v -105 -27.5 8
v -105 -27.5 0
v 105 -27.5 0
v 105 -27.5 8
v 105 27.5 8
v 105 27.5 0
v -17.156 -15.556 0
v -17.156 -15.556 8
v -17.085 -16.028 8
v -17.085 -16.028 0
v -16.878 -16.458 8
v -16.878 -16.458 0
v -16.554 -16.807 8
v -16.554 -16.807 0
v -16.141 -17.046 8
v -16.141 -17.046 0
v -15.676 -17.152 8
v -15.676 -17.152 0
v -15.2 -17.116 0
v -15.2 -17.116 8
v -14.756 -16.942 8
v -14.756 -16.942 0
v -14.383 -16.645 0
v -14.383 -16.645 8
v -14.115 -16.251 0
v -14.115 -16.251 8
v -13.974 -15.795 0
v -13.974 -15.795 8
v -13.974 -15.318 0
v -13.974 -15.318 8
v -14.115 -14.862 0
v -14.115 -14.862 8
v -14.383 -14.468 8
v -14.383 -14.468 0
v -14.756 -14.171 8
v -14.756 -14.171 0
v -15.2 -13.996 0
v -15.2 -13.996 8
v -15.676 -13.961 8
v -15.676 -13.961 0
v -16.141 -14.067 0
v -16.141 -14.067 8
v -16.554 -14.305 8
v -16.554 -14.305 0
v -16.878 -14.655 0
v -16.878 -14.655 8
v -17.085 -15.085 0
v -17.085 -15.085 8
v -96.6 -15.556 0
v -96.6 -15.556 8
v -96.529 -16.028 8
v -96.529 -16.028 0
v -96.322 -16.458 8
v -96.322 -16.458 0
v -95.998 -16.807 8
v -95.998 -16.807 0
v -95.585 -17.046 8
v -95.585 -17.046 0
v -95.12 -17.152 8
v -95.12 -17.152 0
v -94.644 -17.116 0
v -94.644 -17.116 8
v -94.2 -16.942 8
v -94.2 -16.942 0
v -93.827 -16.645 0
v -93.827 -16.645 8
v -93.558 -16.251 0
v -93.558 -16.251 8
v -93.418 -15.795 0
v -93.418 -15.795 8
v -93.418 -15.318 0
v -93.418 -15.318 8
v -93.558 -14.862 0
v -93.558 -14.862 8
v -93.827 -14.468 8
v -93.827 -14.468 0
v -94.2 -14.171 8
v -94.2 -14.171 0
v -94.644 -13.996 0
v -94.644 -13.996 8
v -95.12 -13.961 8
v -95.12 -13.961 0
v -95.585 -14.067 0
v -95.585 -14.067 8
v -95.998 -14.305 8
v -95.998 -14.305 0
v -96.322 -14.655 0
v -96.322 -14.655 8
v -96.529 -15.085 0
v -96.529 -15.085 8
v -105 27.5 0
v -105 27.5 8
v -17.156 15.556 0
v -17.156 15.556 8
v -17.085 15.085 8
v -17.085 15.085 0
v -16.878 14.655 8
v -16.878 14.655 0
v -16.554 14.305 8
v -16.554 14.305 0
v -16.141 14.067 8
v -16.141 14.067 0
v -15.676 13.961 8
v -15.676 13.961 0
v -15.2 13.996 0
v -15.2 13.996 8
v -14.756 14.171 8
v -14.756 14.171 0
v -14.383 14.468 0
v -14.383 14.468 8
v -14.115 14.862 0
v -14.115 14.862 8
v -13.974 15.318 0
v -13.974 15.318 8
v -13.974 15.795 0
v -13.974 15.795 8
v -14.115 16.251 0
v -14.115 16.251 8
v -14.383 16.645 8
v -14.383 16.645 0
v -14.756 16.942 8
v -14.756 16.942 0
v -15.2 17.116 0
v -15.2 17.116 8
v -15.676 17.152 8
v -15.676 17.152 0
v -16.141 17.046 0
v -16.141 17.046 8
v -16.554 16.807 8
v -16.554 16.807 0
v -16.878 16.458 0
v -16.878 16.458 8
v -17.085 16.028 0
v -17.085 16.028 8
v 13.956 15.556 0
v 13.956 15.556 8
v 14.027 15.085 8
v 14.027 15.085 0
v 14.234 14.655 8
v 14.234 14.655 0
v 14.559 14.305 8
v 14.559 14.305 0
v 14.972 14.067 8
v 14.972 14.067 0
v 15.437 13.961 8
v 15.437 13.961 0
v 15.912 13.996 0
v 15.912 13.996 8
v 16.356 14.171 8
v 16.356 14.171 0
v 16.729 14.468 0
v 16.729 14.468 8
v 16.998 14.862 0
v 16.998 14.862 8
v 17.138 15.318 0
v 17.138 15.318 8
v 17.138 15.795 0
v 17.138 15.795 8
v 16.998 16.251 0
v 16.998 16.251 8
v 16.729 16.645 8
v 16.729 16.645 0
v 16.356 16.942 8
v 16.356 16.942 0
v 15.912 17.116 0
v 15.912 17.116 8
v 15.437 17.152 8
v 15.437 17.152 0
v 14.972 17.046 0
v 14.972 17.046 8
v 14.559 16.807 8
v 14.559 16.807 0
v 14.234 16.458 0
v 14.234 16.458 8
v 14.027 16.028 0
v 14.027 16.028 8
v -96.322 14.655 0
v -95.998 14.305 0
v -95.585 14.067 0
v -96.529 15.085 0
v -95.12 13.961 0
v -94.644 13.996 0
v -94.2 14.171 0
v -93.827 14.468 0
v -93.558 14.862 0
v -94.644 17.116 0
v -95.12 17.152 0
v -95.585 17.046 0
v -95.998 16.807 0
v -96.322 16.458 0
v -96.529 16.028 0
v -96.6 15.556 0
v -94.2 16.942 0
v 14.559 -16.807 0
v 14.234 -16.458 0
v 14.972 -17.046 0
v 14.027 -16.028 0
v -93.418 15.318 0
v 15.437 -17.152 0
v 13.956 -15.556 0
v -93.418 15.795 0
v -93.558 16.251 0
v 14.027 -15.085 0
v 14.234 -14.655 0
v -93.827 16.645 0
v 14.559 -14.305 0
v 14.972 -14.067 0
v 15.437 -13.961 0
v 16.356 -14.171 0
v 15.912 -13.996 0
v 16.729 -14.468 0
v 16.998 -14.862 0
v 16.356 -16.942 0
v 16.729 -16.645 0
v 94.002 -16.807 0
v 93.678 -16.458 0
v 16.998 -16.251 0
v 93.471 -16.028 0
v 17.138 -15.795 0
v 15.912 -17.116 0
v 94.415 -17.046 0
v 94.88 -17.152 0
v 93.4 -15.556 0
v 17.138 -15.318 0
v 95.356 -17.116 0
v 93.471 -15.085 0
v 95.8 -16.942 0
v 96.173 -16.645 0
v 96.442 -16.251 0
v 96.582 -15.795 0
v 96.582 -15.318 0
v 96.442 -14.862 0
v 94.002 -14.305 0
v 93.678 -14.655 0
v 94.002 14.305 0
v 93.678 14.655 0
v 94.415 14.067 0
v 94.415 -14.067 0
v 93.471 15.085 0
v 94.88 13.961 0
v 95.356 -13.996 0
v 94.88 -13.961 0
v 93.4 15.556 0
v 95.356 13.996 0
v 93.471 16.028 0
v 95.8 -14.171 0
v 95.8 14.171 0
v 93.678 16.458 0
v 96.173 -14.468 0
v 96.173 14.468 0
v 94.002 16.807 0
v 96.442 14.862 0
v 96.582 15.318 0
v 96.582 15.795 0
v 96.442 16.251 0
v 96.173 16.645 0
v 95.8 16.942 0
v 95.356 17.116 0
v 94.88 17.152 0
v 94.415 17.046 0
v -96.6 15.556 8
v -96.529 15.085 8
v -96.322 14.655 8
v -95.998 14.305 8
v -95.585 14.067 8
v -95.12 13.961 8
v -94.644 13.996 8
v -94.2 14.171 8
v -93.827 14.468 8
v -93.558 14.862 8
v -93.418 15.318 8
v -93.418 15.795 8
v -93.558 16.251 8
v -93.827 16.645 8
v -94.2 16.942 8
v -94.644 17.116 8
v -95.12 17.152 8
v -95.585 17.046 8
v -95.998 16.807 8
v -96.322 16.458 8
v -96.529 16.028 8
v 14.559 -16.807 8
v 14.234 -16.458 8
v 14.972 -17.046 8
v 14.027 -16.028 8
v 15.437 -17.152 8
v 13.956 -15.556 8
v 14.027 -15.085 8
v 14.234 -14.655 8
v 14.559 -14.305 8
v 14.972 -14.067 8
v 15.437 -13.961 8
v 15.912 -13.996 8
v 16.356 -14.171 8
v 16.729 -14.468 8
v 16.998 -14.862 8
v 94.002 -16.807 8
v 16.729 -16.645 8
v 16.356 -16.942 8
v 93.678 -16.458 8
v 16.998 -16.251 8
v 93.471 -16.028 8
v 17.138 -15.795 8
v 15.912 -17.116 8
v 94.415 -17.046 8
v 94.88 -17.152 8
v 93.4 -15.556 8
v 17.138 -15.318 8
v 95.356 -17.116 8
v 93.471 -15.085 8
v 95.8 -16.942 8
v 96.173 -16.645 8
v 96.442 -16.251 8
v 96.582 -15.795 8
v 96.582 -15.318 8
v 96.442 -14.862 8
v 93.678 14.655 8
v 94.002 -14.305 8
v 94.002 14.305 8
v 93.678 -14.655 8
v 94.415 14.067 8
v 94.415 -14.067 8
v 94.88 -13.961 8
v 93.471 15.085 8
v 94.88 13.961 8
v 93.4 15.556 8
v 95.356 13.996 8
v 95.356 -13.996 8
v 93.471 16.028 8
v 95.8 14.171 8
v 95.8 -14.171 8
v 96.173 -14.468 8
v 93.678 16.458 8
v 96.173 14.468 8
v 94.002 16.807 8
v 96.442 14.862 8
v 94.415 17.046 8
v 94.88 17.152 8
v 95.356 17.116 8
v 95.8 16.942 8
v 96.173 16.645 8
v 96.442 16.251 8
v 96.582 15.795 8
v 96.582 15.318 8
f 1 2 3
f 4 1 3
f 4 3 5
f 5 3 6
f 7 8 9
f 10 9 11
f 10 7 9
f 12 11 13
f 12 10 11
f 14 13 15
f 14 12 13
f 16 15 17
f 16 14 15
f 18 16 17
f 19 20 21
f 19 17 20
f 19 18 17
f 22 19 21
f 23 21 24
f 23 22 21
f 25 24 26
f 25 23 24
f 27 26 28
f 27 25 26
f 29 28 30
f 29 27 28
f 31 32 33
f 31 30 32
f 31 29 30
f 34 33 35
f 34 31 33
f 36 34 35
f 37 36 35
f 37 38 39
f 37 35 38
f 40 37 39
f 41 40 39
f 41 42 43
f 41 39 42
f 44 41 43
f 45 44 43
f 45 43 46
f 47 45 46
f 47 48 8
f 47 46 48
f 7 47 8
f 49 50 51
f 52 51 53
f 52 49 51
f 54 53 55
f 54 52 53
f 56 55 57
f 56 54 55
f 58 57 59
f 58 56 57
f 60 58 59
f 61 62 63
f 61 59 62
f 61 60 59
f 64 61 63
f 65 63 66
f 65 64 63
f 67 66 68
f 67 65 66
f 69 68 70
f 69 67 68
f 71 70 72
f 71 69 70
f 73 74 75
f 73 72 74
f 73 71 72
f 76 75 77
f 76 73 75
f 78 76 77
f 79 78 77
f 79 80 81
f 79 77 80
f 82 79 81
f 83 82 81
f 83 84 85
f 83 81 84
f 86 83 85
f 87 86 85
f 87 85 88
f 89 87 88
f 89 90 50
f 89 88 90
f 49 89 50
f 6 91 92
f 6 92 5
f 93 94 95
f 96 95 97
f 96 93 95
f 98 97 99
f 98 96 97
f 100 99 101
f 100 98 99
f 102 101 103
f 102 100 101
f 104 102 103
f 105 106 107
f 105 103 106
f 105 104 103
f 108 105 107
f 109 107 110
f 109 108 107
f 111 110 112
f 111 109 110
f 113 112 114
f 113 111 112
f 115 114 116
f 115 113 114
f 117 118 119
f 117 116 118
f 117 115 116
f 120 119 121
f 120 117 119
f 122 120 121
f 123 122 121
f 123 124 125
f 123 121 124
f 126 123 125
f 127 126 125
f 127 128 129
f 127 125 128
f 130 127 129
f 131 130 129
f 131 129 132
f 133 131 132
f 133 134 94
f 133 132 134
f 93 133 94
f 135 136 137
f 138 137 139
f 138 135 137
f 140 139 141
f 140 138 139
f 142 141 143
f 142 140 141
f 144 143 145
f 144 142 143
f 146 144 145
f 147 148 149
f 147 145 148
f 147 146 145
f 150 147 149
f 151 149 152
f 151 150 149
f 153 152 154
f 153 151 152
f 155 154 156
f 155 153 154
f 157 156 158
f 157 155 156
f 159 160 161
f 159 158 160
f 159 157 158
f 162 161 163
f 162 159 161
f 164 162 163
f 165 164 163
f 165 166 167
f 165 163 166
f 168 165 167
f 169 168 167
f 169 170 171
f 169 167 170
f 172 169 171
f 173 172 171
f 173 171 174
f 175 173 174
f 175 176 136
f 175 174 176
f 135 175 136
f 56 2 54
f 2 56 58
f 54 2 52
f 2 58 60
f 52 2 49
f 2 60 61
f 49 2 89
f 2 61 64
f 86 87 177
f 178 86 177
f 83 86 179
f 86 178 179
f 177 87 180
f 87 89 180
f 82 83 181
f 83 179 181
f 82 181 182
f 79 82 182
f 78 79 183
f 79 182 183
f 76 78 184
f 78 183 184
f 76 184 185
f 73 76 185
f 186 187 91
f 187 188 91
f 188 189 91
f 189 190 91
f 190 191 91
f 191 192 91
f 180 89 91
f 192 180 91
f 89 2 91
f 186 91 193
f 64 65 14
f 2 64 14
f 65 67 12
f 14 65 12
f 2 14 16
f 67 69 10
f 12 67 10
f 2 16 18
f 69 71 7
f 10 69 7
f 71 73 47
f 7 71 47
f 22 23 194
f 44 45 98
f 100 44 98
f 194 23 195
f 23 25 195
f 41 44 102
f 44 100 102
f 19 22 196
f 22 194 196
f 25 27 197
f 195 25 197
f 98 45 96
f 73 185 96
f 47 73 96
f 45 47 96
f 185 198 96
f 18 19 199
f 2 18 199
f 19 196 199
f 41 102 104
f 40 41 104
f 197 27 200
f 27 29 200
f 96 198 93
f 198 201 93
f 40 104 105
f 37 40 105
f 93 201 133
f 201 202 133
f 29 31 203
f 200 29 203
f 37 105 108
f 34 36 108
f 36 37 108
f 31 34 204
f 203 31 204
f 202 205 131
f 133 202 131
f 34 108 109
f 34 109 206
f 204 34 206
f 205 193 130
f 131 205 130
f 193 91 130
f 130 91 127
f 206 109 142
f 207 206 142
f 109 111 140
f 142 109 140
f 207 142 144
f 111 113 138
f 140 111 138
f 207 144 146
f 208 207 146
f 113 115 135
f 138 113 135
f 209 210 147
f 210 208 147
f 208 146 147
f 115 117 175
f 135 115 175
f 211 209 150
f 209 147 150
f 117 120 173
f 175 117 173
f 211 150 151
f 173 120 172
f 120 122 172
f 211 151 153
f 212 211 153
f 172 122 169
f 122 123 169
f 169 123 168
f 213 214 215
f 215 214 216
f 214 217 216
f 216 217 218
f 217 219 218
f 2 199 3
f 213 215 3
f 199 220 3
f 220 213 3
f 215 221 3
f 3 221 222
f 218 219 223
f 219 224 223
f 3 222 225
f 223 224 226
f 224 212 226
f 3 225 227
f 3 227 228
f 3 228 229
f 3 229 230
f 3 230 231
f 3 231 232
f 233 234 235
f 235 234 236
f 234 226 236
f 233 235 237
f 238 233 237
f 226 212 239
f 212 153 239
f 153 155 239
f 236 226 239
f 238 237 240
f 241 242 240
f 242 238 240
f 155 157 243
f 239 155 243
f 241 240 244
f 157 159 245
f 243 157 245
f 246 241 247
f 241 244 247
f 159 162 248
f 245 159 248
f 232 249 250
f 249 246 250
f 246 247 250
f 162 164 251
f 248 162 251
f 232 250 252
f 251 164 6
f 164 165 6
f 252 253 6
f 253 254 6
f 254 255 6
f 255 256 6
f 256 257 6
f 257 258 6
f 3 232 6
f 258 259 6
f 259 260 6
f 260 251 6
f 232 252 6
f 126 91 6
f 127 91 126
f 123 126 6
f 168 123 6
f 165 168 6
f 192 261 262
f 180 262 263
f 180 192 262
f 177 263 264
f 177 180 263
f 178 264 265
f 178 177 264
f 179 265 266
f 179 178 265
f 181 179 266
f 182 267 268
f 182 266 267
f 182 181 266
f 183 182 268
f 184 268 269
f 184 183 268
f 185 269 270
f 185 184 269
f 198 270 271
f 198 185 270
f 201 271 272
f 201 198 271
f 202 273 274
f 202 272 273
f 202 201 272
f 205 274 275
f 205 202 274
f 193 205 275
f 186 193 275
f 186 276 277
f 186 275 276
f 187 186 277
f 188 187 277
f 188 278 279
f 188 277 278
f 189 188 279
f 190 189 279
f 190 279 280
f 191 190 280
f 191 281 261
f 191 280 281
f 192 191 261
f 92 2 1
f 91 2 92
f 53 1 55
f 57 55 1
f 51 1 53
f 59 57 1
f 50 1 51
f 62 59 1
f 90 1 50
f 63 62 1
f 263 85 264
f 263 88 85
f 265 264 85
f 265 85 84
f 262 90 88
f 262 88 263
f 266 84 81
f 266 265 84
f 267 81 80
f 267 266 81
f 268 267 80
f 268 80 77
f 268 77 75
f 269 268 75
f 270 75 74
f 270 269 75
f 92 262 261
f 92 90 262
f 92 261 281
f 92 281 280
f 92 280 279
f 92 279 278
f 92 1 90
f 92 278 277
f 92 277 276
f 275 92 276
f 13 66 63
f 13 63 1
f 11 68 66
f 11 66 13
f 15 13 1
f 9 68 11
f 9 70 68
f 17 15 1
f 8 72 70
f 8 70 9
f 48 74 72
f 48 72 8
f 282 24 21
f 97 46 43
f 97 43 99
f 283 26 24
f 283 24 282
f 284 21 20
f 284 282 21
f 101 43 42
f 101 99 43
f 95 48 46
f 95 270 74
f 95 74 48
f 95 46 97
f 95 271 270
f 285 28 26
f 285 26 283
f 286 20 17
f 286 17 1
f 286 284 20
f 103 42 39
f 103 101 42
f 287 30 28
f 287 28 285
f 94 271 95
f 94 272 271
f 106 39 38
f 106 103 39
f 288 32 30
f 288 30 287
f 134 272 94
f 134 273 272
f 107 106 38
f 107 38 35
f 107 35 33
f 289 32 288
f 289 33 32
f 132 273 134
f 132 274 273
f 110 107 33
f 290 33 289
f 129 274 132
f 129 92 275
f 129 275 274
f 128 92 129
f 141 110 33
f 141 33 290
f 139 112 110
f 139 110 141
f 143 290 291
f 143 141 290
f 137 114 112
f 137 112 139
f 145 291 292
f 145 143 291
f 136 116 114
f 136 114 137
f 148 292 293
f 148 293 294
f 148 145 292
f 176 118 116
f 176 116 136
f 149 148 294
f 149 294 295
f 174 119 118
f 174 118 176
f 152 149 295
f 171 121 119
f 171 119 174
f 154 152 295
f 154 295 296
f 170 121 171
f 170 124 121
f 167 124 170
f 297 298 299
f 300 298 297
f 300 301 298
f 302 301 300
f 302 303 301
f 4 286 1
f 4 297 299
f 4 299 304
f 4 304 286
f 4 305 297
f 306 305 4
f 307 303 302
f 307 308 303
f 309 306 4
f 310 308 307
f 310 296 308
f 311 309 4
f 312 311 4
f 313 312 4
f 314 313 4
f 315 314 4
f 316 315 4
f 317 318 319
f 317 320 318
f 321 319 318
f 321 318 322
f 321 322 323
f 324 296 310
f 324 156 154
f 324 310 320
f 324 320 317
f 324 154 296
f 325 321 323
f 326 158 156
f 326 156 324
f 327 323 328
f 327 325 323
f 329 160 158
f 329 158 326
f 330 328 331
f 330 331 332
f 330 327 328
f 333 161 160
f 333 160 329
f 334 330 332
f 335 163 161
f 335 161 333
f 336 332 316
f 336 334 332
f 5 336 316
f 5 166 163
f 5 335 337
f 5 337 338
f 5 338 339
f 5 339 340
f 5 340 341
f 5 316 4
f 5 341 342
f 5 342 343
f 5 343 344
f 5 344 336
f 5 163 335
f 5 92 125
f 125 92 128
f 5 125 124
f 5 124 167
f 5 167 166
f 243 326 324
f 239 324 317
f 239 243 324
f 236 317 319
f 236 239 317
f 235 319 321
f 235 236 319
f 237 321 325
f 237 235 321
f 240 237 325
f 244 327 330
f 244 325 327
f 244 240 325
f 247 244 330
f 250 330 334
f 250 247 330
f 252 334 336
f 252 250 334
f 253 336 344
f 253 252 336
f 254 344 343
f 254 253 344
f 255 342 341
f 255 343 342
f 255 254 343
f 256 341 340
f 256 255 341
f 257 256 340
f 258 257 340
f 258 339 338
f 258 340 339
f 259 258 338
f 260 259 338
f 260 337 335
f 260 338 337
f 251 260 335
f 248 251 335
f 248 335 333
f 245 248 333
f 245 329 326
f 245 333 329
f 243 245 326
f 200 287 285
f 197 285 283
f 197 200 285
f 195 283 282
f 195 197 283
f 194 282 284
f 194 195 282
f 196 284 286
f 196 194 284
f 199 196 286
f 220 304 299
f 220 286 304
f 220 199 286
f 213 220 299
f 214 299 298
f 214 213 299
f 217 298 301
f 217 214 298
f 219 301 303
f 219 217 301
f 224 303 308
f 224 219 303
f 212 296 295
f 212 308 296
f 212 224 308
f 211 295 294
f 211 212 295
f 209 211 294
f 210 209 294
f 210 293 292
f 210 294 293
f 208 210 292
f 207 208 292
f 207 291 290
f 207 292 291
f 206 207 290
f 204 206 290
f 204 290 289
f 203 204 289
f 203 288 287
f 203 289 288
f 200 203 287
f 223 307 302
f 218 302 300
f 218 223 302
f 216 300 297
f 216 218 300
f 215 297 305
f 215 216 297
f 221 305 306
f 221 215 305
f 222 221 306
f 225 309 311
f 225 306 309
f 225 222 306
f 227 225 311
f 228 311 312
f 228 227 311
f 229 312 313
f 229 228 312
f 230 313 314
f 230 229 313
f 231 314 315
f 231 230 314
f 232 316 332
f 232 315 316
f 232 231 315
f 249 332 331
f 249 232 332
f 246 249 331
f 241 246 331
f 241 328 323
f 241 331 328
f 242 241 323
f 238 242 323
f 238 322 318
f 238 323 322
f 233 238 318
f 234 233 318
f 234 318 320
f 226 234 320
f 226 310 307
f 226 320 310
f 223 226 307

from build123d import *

# Parameters (mm, degrees)
SKETCH1_W           = 210
SKETCH1_H           = 55
BOSS_EXTRUDE1_DEPTH = 8
SKETCH2_R           = 1.6
CUT_EXTRUDE2_DEPTH  = 9


with BuildPart() as part:
    # Sketch1 → Boss-Extrude1 (new body)
    with BuildSketch(Plane.XY):
        Rectangle(SKETCH1_W, SKETCH1_H)
    extrude(amount=BOSS_EXTRUDE1_DEPTH)

    # Sketch2 → Cut-Extrude2 (cut)
    with BuildSketch(Plane.XY):
        with Locations(Location((15.556349186, 15.556349186, 0), (0, 0, 180))):
            Circle(SKETCH2_R)
        with Locations(Location((-15.556349186, 15.556349186, 0), (0, 0, 180))):
            Circle(SKETCH2_R)
        with Locations(Location((-15.556349186, -15.556349186, 0), (0, 0, 180))):
            Circle(SKETCH2_R)
        with Locations(Location((15.556349186, -15.556349186, 0), (0, 0, 180))):
            Circle(SKETCH2_R)
        with Locations(Location((-95, 15.556349186, 0), (0, 0, 180))):
            Circle(SKETCH2_R)
        with Locations(Location((-95, -15.556349186, 0), (0, 0, 180))):
            Circle(SKETCH2_R)
        with Locations(Location((95, 15.556349186, 0), (0, 0, 180))):
            Circle(SKETCH2_R)
        with Locations(Location((95, -15.556349186, 0), (0, 0, 180))):
            Circle(SKETCH2_R)
    extrude(amount=CUT_EXTRUDE2_DEPTH, mode=Mode.SUBTRACT)


solid = part.part
